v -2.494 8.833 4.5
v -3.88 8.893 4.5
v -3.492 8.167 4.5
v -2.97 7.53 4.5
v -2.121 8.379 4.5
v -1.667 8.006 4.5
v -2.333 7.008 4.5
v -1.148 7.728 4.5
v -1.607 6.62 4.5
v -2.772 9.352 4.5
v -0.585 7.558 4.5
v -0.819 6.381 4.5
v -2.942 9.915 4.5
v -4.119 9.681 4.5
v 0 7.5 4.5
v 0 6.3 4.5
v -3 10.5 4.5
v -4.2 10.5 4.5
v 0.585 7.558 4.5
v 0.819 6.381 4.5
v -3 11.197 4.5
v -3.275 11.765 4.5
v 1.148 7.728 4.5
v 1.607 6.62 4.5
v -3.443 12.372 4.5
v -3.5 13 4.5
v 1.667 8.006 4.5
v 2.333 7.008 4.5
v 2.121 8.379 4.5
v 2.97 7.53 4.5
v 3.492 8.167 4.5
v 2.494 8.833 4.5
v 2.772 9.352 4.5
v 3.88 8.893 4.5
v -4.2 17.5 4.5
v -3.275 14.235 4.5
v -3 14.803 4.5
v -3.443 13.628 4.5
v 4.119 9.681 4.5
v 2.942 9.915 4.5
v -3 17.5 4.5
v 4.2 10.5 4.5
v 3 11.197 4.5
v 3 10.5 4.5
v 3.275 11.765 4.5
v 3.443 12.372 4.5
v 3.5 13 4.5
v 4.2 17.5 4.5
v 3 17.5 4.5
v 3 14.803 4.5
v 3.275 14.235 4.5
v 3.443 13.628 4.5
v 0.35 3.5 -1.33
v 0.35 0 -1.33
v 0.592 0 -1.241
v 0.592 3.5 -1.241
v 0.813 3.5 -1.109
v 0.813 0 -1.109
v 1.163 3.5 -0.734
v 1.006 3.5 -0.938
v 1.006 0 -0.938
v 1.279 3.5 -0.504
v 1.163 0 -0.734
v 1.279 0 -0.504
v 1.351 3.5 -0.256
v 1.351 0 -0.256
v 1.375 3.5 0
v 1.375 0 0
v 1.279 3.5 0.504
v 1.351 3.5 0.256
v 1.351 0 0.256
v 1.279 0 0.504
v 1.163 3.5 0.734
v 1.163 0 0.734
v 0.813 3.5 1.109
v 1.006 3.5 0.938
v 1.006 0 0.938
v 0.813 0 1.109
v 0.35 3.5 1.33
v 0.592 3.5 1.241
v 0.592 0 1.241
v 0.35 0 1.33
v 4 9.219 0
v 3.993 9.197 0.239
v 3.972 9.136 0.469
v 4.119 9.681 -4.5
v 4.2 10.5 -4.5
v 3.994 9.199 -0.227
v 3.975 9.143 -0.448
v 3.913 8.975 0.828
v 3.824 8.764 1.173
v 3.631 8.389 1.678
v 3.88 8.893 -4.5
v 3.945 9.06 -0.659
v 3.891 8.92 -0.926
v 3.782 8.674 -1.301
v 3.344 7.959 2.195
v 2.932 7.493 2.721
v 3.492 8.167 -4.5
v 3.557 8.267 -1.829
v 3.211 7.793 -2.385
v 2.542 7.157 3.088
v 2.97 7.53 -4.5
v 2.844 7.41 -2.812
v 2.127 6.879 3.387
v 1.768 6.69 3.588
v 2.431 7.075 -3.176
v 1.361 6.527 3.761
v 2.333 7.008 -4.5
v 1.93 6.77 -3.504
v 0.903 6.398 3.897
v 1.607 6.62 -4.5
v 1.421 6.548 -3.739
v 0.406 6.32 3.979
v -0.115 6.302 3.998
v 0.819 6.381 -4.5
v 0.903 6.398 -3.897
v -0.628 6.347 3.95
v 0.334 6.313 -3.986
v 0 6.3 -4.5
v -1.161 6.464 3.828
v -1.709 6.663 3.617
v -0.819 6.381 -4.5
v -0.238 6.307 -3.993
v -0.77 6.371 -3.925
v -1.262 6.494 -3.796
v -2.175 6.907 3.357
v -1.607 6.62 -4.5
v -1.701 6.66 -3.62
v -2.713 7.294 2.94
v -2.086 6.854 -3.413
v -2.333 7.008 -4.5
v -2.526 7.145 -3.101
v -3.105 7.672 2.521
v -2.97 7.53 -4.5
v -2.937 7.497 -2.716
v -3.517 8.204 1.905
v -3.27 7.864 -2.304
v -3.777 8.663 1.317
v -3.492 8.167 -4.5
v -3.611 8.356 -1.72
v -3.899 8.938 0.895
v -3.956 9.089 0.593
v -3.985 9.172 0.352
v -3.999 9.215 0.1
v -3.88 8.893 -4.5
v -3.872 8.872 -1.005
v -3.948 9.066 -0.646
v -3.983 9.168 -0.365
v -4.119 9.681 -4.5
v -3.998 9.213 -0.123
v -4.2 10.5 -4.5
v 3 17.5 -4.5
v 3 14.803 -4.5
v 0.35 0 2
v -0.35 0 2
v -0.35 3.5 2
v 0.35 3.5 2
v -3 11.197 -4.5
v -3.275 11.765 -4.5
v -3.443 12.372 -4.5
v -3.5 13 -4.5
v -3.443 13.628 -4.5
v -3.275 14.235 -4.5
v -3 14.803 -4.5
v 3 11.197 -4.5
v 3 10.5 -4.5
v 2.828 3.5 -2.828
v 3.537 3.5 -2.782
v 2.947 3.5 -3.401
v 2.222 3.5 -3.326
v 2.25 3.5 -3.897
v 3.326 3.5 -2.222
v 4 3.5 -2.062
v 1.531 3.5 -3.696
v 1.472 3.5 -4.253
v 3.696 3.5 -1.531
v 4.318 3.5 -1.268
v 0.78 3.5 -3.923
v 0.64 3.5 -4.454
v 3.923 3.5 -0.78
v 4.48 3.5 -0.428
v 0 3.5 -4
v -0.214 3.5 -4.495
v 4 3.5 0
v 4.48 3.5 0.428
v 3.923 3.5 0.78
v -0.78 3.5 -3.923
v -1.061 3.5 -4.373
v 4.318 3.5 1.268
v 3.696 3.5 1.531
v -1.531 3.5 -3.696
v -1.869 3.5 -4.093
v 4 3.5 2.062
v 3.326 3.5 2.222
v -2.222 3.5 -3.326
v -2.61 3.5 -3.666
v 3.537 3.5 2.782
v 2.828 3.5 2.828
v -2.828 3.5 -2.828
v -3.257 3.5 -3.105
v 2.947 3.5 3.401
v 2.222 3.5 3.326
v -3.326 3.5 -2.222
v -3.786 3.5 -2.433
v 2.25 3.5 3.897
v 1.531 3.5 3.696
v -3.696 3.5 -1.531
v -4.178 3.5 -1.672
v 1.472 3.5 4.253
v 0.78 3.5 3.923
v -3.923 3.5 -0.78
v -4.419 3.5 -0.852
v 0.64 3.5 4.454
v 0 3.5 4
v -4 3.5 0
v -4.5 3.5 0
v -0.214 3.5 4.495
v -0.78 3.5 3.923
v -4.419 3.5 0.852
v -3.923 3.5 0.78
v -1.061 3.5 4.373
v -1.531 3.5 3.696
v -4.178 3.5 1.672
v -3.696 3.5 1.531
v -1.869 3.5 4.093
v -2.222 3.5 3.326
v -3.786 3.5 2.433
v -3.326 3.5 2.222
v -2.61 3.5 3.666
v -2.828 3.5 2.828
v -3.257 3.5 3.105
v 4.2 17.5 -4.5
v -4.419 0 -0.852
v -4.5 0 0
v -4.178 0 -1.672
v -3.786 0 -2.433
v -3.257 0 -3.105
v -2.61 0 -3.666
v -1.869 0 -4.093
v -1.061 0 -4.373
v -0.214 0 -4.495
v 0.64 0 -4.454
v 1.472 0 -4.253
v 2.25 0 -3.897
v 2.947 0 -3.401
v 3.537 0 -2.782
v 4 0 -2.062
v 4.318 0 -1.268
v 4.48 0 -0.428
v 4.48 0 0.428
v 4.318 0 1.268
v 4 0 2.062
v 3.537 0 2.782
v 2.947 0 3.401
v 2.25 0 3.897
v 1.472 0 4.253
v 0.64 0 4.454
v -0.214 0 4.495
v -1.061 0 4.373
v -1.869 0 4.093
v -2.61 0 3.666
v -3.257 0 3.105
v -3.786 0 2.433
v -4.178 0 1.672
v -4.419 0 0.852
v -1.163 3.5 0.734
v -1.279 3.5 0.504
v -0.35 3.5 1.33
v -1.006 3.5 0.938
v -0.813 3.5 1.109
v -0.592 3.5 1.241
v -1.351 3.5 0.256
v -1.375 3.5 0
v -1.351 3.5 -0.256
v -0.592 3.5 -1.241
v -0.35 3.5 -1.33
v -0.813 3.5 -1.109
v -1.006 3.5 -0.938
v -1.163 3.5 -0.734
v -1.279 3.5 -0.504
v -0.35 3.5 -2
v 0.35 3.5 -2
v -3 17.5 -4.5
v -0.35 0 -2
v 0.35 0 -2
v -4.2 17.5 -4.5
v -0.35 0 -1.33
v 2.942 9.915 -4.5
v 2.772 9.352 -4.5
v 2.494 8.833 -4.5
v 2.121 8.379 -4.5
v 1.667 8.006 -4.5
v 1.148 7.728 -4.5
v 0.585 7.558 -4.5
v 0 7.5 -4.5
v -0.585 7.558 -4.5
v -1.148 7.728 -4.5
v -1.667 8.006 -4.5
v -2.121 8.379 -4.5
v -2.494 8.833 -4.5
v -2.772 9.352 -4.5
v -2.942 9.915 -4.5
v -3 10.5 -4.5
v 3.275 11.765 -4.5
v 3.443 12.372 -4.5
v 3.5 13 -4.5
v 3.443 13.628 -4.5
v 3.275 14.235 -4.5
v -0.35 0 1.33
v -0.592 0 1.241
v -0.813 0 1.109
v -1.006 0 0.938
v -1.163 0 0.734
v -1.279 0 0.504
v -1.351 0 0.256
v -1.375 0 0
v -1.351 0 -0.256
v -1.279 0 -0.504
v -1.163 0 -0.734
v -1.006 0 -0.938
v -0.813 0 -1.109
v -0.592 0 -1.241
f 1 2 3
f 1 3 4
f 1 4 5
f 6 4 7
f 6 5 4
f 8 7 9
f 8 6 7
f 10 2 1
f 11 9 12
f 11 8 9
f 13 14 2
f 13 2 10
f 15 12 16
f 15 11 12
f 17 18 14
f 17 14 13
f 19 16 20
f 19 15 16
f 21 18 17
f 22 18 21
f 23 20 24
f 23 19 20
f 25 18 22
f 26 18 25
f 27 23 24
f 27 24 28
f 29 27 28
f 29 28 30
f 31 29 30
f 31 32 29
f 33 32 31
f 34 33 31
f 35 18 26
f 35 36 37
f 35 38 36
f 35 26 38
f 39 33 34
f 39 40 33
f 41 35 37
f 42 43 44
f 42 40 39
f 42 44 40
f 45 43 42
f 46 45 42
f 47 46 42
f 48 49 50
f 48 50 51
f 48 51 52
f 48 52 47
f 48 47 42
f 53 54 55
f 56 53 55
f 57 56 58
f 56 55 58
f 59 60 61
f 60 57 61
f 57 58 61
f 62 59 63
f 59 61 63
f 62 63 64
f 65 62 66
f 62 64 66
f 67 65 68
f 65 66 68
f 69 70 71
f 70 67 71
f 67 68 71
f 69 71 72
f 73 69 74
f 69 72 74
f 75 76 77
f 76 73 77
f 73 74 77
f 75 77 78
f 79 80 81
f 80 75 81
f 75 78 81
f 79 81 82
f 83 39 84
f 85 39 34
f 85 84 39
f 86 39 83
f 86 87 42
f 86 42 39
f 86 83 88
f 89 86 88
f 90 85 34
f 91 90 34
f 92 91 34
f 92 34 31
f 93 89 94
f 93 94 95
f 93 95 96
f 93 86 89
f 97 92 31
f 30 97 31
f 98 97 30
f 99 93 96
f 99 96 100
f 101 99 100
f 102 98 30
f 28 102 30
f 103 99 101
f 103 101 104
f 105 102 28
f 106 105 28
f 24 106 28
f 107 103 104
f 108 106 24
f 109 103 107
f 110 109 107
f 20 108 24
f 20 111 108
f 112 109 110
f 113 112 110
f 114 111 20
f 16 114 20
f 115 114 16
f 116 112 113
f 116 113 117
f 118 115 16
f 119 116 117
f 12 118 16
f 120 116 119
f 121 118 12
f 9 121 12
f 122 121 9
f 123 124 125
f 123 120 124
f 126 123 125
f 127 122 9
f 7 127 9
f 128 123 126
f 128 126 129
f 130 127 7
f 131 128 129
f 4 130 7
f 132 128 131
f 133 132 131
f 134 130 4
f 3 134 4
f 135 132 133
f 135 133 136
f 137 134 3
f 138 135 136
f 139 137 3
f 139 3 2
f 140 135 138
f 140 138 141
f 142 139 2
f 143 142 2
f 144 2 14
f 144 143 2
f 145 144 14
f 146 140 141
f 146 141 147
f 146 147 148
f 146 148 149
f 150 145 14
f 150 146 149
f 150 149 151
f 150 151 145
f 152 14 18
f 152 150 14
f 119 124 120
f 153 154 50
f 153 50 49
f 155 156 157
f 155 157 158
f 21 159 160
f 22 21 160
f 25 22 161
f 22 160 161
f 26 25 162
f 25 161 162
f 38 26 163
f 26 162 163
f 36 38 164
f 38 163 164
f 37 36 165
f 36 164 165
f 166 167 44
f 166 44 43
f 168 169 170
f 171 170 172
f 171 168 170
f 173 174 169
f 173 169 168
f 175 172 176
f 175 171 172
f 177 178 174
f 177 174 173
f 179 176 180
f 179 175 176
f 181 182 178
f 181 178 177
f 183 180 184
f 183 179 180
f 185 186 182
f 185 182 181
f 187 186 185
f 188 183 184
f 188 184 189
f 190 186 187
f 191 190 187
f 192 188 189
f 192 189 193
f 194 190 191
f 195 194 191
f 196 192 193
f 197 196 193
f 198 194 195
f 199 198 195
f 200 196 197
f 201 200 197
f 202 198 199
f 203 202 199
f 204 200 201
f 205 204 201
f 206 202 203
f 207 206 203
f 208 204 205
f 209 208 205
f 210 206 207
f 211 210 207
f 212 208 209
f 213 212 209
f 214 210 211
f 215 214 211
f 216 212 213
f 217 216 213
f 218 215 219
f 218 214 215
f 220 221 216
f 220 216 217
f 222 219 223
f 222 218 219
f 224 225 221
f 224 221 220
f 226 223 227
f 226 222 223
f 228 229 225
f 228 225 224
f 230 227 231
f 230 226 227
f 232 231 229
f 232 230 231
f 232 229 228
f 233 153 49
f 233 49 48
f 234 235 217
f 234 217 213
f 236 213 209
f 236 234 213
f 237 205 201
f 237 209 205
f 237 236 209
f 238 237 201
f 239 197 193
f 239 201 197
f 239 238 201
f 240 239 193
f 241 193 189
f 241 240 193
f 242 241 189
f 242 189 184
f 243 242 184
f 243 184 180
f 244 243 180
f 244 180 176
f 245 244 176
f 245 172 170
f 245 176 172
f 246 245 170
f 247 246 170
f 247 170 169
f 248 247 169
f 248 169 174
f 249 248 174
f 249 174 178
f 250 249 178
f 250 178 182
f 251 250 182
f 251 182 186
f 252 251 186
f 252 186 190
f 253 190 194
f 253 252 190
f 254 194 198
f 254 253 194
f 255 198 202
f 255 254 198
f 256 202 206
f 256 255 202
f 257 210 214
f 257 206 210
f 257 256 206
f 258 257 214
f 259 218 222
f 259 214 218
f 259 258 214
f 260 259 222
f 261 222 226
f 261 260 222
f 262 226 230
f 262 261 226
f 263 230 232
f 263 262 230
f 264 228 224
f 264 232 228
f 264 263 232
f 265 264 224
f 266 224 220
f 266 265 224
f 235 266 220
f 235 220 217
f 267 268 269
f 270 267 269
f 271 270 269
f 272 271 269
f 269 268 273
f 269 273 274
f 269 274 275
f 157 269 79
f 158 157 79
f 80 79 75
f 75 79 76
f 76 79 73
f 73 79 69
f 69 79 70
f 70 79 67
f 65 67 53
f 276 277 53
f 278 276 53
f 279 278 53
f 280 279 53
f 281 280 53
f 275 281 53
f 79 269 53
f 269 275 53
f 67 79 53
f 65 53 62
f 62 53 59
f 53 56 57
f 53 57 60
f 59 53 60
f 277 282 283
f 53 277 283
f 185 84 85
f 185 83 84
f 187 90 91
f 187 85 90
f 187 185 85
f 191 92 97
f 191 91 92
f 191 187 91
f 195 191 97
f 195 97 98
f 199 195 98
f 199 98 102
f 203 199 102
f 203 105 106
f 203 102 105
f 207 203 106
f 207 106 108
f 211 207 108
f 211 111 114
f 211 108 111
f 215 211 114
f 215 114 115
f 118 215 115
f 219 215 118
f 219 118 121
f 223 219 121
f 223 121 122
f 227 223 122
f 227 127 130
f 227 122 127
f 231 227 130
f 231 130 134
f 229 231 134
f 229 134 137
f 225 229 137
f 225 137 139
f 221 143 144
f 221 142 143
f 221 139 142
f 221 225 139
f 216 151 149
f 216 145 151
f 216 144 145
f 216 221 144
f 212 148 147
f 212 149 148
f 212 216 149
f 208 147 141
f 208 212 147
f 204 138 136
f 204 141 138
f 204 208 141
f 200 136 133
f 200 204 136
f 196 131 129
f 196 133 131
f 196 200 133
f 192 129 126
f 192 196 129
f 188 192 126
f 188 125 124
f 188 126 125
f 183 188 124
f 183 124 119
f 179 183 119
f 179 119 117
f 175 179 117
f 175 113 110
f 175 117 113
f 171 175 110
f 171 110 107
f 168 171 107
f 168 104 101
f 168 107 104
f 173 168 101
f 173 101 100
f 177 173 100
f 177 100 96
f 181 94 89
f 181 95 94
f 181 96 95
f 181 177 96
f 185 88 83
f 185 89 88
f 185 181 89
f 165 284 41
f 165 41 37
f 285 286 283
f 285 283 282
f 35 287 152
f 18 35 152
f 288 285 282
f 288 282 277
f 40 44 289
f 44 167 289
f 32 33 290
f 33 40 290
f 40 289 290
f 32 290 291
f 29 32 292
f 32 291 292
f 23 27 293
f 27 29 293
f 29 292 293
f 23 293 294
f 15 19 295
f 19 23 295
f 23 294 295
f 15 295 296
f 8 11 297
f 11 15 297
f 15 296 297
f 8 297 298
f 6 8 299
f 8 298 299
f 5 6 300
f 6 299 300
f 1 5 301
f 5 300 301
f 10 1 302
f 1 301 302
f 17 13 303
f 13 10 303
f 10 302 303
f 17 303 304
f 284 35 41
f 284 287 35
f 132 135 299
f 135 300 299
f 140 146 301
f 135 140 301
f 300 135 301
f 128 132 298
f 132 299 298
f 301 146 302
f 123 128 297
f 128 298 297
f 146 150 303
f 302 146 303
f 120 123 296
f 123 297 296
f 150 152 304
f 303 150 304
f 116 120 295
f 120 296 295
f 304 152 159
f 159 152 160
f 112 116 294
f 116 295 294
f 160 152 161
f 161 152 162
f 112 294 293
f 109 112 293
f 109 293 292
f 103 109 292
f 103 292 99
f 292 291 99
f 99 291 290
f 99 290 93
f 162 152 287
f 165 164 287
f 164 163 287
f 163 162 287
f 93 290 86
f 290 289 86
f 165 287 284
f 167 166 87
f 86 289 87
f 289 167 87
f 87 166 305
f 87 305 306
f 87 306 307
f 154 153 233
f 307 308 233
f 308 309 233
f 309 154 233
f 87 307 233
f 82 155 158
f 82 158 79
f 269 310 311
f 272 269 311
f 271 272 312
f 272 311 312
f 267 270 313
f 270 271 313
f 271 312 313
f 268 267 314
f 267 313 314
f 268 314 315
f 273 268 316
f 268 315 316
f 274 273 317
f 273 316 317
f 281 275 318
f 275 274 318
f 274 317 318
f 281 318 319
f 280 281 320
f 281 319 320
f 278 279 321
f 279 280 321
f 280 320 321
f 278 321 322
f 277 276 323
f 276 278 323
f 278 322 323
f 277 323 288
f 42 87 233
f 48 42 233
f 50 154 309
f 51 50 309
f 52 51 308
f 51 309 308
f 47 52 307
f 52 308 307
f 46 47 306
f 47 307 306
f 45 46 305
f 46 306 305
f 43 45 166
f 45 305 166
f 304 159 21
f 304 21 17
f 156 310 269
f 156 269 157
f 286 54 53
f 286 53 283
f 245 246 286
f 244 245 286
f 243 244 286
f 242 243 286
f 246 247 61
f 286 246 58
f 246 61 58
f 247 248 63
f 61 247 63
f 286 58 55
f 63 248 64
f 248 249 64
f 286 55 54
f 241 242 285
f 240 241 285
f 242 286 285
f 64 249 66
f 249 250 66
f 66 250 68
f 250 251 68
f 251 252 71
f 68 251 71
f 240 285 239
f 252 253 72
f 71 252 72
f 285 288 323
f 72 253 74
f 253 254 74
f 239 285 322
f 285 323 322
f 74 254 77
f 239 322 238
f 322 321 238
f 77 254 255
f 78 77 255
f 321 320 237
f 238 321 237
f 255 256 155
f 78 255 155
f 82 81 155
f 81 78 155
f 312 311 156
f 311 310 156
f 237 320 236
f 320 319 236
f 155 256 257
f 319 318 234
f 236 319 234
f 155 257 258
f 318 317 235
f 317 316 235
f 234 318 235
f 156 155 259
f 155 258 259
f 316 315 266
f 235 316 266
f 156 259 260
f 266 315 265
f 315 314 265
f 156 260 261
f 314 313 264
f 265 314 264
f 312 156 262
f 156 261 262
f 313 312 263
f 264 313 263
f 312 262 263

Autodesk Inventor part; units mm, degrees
ref_plane "YZ Plane" through (0, 0, 0) normal (1, 0, 0) x (0, 1, 0)
ref_plane "XZ Plane" through (0, 0, 0) normal (0, 1, 0) x (-1, 0, 0)
ref_plane "XY Plane" through (0, 0, 0) normal (0, 0, 1) x (1, 0, 0)
sketch "Sketch1" plane through (0, 0, 0) normal (0, 1, 0) x (-1, 0, 0)
  circle A0 centre (0, 0) radius 1.115 construction
  arc A1 (-0.35, 1.3297) -> (-0.35, -1.3297) centre (0, 0) ccw
  circle A2 centre (0, 0) radius 4.5
  line L0 (0.35, 2) -> (-0.35, 2)
  line L1 (-0.35, 2) -> (-0.35, -2)
  line L2 (-0.35, -2) -> (0.35, -2)
  line L3 (0.35, -2) -> (0.35, 2)
  arc A3 (0.35, 1.3297) -> (-0.35, 1.3297) centre (0, 0) ccw
  arc A4 (0.35, -1.3297) -> (0.35, 1.3297) centre (0, 0) ccw
  arc A5 (-0.35, -1.3297) -> (0.35, -1.3297) centre (0, 0) ccw
  point P0 (0, 2)
  point P1 (0.35, 0)
  dimension "d1" = 2.23
  dimension "d3" = 9
  dimension "d18" = 0.26
  dimension "d19" = 0.7
  dimension "d20" = 4
extrude "Extrusion1" add sketch "Sketch1" along normal blind 3.5
sketch "Sketch4" plane through (0, 0, 0) normal (0, 0, 1) x (1, 0, 0)
  line L0 (-4.2, 17.5) -> (-4.2, 10.5)
  arc A0 (-4.2, 10.5) -> (4.2, 10.5) centre (0, 10.5) ccw
  line L1 (4.2, 10.5) -> (4.2, 17.5)
  line L2 (-3, 17.5) -> (-3, 14.8028)
  arc A1 (-3, 10.5) -> (3, 10.5) centre (0, 10.5) ccw
  line L3 (3, 10.5) -> (3, 11.1972)
  line L4 (-4.2, 17.5) -> (-3, 17.5)
  line L5 (3, 17.5) -> (4.2, 17.5)
  line L6 (-0.35, 0) -> (0.35, 0) projected
  line L7 (4.5, 3.5) -> (-4.5, 3.5) projected
  circle A2 centre (0, 13) radius 3.5
  line L8 (-3, 14.8028) -> (-3, 11.1972)
  line L9 (-3, 11.1972) -> (-3, 10.5)
  line L10 (3, 11.1972) -> (3, 14.8028)
  line L11 (3, 14.8028) -> (3, 17.5)
  point P0 (0, 0)
  point P1 (0, 0)
  dimension "d21" = 3
  dimension "d23" = 1.2
  dimension "d24" = 7
  dimension "d25" = 7
  dimension "d26" = 7
  dimension "d27" = 2.5
extrude "Extrusion5" add sketch "Sketch4" along normal mid plane 9 contours L4 L2 A2 L9 A1 L3 L11 L5 L1 A0 L0
sketch "Sketch8" plane through (0, 3.5, 0) normal (0, 1, 0) x (1, 0, 0)
  circle A0 centre (0, 0) radius 4
  dimension "d33" = 8
extrude "Extrusion6" add sketch "Sketch8" along normal up to next
sketch "Sketch2" plane through (0, 3.5, 0) normal (0, 1, 0) x (1, 0, 0)
  circle A0 centre (0, 0) radius 1.375 projected
  circle A1 centre (0, 0) radius 3.375
  dimension "d6" = 2
  dimension "d9" = 7.3
  dimension "d10" = 2
properties part number "Laser Mount Mk2"
